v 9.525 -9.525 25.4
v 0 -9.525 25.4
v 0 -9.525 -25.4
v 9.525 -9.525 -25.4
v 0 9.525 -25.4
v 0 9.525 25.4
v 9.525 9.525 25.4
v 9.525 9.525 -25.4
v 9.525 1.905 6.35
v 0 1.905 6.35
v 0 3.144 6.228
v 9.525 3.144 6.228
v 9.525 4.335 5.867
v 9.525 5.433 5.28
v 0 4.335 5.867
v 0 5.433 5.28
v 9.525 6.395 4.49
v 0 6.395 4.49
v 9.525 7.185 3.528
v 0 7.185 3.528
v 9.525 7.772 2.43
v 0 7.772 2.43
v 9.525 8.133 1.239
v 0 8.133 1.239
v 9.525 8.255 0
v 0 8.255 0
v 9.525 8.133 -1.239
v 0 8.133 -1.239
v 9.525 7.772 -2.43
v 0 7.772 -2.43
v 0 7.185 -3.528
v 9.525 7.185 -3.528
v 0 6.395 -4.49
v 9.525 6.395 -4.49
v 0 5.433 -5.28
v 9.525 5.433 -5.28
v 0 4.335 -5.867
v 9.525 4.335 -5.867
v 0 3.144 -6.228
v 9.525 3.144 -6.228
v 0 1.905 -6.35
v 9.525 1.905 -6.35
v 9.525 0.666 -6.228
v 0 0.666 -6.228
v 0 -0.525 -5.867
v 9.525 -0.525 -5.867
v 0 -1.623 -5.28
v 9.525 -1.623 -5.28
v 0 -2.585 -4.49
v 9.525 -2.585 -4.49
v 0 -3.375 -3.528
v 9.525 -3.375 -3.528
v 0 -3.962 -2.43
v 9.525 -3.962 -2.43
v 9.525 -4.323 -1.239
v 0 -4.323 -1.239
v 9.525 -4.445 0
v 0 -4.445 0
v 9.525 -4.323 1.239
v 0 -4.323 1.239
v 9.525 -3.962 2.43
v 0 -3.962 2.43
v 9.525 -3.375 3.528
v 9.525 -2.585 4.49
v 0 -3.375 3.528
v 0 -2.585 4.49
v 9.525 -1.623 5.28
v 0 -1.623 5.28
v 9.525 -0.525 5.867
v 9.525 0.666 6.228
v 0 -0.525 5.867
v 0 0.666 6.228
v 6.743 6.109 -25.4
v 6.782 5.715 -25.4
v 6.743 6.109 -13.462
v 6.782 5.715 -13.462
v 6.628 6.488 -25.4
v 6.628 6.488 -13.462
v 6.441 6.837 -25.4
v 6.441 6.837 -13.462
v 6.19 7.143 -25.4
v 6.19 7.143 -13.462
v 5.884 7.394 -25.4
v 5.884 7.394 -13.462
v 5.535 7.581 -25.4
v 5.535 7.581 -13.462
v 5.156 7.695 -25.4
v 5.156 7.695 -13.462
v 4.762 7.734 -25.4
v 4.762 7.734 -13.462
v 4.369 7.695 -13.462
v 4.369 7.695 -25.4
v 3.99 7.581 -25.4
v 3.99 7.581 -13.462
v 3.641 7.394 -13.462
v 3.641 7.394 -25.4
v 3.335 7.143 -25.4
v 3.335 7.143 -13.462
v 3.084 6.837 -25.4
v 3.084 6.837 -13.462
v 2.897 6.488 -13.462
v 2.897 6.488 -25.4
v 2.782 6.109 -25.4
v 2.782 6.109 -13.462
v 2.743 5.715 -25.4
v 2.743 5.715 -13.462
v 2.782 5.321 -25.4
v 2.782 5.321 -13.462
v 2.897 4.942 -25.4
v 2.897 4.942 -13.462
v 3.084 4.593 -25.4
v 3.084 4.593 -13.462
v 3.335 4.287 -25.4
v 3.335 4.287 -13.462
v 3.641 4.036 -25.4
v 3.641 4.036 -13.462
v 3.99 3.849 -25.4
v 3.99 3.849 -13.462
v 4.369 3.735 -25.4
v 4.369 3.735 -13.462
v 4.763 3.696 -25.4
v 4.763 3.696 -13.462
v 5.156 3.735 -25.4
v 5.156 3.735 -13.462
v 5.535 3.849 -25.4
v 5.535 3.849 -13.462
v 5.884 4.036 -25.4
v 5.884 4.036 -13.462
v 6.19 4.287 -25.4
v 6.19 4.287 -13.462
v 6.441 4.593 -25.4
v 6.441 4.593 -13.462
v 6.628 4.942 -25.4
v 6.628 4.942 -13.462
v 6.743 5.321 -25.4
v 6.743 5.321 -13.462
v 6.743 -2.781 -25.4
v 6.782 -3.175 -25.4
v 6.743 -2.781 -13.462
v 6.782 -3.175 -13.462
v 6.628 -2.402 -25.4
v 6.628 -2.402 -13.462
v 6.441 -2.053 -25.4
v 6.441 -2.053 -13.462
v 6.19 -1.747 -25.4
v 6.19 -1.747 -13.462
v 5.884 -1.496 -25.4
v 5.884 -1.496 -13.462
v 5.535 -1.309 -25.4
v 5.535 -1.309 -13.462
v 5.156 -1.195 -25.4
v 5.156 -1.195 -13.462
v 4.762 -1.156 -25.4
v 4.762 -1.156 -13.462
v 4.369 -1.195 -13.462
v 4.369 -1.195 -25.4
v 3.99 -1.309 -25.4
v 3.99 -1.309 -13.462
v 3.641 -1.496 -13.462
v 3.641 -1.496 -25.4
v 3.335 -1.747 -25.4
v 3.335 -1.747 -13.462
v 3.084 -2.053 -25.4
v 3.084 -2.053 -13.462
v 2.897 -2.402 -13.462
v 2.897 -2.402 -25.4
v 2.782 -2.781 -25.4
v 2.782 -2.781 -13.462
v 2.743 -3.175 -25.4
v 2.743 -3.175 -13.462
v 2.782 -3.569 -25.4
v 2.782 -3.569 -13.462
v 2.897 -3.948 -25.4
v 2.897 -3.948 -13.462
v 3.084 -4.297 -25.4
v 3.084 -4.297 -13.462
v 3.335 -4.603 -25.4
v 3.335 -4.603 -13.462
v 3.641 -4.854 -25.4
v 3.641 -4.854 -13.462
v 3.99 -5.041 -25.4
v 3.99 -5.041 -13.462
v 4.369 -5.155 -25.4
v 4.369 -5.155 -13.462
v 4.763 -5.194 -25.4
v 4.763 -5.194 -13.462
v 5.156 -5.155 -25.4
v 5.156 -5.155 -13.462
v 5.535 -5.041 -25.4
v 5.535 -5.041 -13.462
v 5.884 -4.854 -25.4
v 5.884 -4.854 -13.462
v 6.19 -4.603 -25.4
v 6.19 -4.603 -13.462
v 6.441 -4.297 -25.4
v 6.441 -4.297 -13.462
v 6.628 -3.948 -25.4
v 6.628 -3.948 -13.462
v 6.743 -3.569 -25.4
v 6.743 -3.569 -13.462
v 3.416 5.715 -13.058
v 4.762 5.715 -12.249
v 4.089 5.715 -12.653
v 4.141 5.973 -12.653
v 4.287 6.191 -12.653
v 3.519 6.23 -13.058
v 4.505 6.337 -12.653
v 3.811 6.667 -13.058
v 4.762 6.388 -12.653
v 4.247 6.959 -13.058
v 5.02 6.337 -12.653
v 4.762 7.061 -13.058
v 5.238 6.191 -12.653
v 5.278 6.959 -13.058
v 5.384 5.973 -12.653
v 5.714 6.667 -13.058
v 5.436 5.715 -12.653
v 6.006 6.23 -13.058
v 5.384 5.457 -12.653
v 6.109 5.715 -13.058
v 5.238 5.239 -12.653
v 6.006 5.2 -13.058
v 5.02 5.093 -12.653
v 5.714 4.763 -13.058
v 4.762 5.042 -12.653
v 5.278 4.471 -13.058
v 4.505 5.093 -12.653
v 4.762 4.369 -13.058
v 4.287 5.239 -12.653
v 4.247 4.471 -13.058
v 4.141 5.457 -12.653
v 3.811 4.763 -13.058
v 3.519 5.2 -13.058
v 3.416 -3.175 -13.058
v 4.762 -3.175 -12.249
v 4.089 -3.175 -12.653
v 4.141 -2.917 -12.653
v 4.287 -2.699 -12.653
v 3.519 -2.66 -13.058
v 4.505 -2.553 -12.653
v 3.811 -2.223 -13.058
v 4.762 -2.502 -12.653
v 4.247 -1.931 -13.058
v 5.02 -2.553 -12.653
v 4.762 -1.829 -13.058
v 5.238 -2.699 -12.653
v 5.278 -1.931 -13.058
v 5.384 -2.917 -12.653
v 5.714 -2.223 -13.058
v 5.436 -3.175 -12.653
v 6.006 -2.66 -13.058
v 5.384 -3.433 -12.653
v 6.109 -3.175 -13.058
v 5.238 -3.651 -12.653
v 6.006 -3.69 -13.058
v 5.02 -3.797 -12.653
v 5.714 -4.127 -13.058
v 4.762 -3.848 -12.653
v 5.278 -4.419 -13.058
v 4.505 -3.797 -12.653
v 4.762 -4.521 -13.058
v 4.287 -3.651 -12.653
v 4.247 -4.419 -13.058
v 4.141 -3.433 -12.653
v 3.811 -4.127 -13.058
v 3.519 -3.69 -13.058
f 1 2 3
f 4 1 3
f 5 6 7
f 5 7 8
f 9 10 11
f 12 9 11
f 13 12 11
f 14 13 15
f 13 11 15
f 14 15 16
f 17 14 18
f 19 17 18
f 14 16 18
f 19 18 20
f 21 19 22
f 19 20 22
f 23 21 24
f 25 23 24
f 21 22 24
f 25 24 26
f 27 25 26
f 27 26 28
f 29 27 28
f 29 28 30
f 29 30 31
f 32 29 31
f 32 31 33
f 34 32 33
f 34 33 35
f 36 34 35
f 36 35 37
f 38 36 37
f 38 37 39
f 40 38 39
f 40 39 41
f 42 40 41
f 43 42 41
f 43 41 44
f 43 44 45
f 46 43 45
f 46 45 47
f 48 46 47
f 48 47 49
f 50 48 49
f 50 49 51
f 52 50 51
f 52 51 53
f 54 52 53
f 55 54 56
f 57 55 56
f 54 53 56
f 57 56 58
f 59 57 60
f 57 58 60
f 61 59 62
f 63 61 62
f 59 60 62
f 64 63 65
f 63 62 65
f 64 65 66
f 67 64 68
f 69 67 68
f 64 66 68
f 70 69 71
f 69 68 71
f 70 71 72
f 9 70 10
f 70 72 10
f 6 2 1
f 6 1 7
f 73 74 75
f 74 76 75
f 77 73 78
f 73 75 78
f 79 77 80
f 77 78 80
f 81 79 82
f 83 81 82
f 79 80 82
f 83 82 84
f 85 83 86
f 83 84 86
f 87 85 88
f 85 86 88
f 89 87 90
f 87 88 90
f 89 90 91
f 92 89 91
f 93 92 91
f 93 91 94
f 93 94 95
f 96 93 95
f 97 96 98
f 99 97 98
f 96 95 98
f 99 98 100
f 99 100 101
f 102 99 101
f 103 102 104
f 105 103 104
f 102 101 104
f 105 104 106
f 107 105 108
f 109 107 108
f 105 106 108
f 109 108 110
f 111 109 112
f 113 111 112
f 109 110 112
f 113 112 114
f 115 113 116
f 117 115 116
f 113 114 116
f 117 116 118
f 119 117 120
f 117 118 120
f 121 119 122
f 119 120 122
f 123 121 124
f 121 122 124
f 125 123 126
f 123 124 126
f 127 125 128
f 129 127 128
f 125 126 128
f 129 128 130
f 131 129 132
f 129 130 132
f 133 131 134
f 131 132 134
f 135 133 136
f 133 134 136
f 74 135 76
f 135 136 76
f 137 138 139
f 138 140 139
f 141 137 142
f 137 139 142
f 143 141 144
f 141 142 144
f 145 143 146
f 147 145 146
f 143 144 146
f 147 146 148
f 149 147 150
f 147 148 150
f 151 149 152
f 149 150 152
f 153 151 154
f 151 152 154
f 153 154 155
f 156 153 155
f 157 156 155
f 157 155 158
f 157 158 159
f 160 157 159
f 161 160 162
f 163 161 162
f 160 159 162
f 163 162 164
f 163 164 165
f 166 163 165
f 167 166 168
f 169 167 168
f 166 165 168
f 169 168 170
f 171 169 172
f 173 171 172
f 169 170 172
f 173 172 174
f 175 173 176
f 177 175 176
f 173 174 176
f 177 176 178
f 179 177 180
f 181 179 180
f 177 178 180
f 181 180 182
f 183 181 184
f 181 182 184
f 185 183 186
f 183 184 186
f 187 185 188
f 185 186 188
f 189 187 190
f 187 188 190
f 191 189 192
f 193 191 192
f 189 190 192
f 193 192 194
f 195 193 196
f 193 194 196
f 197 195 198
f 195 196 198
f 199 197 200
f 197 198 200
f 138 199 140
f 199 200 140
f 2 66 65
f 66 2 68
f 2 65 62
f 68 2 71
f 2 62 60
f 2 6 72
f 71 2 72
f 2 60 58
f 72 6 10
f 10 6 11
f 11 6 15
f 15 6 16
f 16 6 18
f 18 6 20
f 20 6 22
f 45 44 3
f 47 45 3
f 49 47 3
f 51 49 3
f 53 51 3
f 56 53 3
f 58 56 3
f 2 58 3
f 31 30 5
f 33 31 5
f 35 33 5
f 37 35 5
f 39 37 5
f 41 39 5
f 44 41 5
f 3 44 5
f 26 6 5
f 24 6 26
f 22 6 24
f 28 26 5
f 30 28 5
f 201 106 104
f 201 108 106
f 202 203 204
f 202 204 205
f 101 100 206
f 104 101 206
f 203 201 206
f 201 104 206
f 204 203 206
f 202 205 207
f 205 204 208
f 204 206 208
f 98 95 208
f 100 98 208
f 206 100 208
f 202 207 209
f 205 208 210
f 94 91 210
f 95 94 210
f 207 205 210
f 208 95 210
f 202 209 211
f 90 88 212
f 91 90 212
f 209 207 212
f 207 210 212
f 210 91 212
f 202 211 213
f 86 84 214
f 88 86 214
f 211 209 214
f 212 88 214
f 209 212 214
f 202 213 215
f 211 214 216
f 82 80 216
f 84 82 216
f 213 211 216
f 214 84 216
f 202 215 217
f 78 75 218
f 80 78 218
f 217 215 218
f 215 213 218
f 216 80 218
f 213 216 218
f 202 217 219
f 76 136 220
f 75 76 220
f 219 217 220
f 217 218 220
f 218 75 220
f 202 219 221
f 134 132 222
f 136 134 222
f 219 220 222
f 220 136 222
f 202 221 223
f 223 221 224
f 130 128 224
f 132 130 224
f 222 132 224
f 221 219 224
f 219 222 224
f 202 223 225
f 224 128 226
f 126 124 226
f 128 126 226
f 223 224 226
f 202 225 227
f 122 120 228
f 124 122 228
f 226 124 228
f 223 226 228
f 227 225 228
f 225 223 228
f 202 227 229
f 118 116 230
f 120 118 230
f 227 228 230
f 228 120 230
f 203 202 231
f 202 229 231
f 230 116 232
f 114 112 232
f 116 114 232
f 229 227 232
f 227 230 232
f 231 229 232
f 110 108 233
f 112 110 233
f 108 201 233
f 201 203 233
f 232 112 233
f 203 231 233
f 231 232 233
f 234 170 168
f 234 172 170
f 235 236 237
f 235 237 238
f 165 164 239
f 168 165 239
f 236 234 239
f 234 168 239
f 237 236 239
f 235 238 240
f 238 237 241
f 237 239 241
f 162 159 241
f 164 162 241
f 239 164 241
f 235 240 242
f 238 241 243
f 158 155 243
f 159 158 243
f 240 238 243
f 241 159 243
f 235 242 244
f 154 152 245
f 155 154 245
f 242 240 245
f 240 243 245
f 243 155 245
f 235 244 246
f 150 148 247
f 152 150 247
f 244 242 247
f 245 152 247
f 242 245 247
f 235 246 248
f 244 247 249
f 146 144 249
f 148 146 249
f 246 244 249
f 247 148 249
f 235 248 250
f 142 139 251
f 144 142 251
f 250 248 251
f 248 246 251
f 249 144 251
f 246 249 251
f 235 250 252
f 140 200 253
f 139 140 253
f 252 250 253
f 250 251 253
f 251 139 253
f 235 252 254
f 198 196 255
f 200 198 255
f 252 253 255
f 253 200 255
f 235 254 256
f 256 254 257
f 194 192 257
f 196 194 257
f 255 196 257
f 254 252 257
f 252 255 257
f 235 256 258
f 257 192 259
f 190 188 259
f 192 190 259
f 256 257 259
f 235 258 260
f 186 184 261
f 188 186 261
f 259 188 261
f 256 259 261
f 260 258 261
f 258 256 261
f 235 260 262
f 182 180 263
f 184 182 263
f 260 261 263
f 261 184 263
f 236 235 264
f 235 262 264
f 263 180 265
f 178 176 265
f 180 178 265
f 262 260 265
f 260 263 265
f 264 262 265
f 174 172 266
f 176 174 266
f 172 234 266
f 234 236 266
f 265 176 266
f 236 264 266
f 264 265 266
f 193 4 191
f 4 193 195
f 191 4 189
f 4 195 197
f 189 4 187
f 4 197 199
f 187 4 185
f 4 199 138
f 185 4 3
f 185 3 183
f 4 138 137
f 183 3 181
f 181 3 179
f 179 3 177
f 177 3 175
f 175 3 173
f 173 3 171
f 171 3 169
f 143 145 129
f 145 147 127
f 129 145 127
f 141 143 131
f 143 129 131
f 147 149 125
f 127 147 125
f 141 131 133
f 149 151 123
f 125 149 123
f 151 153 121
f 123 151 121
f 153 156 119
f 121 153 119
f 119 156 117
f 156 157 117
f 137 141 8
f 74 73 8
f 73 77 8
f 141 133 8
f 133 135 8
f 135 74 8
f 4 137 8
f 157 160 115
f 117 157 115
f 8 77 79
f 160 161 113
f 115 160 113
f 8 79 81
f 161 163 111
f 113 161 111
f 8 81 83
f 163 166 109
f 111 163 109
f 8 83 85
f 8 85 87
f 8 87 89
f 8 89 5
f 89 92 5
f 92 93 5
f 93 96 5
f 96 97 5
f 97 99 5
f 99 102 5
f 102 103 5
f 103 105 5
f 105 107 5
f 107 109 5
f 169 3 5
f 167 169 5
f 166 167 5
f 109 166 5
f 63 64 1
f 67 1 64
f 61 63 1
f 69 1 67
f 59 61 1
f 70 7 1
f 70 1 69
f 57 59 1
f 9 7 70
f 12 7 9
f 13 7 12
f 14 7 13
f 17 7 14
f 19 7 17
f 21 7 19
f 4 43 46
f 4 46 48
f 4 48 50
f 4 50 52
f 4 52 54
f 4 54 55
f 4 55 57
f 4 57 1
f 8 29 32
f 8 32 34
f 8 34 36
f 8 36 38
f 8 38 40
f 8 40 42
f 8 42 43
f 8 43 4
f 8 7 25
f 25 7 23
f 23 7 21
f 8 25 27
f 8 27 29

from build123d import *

# Parameters (mm, degrees)
SKETCH1_W                      = 50.8
SKETCH1_H                      = 19.05
BOSS_EXTRUDE1_DEPTH            = 9.525
F_1_2_0_5_DIAMETER_HOLE1_D     = 12.7
F_1_2_0_5_DIAMETER_HOLE1_DEPTH = 70.104
F_1_2_0_5_DIAMETER_HOLE1_TIP   = 3.815464931
F_10_32_TAPPED_HOLE1_D         = 4.0386
F_10_32_TAPPED_HOLE1_DEPTH     = 11.938
F_10_32_TAPPED_HOLE1_TIP       = 1.213317848


with BuildPart() as part:
    # Sketch1 → Boss-Extrude1 (new body)
    with BuildSketch(Plane(origin=(0, 0, 0), x_dir=(0, 0, -1), z_dir=(1, 0, 0))):
        Rectangle(SKETCH1_W, SKETCH1_H)
    extrude(amount=BOSS_EXTRUDE1_DEPTH)

    # 1/2 (0.5) Diameter Hole1
    with Locations(Plane(origin=(9.525, 0, 0), x_dir=(0, 0, -1), z_dir=(1, 0, 0))):
        with Locations((0, 1.905)):
            Hole(F_1_2_0_5_DIAMETER_HOLE1_D / 2, depth=F_1_2_0_5_DIAMETER_HOLE1_DEPTH)
            with Locations((0, 0, -(F_1_2_0_5_DIAMETER_HOLE1_DEPTH + F_1_2_0_5_DIAMETER_HOLE1_TIP / 2))):  # 118° drill point
                Cone(0, F_1_2_0_5_DIAMETER_HOLE1_D / 2, F_1_2_0_5_DIAMETER_HOLE1_TIP, mode=Mode.SUBTRACT)

    # #10-32 Tapped Hole1
    with Locations(Plane(origin=(-1.022565875, -1.088669914, -25.4), x_dir=(-1, 0, 0), z_dir=(0, 0, -1))):
        with Locations((-5.785065875, -2.086330086), (-5.785065875, 6.803669914)):
            Hole(F_10_32_TAPPED_HOLE1_D / 2, depth=F_10_32_TAPPED_HOLE1_DEPTH)
            with Locations((0, 0, -(F_10_32_TAPPED_HOLE1_DEPTH + F_10_32_TAPPED_HOLE1_TIP / 2))):  # 118° drill point
                Cone(0, F_10_32_TAPPED_HOLE1_D / 2, F_10_32_TAPPED_HOLE1_TIP, mode=Mode.SUBTRACT)


solid = part.part
